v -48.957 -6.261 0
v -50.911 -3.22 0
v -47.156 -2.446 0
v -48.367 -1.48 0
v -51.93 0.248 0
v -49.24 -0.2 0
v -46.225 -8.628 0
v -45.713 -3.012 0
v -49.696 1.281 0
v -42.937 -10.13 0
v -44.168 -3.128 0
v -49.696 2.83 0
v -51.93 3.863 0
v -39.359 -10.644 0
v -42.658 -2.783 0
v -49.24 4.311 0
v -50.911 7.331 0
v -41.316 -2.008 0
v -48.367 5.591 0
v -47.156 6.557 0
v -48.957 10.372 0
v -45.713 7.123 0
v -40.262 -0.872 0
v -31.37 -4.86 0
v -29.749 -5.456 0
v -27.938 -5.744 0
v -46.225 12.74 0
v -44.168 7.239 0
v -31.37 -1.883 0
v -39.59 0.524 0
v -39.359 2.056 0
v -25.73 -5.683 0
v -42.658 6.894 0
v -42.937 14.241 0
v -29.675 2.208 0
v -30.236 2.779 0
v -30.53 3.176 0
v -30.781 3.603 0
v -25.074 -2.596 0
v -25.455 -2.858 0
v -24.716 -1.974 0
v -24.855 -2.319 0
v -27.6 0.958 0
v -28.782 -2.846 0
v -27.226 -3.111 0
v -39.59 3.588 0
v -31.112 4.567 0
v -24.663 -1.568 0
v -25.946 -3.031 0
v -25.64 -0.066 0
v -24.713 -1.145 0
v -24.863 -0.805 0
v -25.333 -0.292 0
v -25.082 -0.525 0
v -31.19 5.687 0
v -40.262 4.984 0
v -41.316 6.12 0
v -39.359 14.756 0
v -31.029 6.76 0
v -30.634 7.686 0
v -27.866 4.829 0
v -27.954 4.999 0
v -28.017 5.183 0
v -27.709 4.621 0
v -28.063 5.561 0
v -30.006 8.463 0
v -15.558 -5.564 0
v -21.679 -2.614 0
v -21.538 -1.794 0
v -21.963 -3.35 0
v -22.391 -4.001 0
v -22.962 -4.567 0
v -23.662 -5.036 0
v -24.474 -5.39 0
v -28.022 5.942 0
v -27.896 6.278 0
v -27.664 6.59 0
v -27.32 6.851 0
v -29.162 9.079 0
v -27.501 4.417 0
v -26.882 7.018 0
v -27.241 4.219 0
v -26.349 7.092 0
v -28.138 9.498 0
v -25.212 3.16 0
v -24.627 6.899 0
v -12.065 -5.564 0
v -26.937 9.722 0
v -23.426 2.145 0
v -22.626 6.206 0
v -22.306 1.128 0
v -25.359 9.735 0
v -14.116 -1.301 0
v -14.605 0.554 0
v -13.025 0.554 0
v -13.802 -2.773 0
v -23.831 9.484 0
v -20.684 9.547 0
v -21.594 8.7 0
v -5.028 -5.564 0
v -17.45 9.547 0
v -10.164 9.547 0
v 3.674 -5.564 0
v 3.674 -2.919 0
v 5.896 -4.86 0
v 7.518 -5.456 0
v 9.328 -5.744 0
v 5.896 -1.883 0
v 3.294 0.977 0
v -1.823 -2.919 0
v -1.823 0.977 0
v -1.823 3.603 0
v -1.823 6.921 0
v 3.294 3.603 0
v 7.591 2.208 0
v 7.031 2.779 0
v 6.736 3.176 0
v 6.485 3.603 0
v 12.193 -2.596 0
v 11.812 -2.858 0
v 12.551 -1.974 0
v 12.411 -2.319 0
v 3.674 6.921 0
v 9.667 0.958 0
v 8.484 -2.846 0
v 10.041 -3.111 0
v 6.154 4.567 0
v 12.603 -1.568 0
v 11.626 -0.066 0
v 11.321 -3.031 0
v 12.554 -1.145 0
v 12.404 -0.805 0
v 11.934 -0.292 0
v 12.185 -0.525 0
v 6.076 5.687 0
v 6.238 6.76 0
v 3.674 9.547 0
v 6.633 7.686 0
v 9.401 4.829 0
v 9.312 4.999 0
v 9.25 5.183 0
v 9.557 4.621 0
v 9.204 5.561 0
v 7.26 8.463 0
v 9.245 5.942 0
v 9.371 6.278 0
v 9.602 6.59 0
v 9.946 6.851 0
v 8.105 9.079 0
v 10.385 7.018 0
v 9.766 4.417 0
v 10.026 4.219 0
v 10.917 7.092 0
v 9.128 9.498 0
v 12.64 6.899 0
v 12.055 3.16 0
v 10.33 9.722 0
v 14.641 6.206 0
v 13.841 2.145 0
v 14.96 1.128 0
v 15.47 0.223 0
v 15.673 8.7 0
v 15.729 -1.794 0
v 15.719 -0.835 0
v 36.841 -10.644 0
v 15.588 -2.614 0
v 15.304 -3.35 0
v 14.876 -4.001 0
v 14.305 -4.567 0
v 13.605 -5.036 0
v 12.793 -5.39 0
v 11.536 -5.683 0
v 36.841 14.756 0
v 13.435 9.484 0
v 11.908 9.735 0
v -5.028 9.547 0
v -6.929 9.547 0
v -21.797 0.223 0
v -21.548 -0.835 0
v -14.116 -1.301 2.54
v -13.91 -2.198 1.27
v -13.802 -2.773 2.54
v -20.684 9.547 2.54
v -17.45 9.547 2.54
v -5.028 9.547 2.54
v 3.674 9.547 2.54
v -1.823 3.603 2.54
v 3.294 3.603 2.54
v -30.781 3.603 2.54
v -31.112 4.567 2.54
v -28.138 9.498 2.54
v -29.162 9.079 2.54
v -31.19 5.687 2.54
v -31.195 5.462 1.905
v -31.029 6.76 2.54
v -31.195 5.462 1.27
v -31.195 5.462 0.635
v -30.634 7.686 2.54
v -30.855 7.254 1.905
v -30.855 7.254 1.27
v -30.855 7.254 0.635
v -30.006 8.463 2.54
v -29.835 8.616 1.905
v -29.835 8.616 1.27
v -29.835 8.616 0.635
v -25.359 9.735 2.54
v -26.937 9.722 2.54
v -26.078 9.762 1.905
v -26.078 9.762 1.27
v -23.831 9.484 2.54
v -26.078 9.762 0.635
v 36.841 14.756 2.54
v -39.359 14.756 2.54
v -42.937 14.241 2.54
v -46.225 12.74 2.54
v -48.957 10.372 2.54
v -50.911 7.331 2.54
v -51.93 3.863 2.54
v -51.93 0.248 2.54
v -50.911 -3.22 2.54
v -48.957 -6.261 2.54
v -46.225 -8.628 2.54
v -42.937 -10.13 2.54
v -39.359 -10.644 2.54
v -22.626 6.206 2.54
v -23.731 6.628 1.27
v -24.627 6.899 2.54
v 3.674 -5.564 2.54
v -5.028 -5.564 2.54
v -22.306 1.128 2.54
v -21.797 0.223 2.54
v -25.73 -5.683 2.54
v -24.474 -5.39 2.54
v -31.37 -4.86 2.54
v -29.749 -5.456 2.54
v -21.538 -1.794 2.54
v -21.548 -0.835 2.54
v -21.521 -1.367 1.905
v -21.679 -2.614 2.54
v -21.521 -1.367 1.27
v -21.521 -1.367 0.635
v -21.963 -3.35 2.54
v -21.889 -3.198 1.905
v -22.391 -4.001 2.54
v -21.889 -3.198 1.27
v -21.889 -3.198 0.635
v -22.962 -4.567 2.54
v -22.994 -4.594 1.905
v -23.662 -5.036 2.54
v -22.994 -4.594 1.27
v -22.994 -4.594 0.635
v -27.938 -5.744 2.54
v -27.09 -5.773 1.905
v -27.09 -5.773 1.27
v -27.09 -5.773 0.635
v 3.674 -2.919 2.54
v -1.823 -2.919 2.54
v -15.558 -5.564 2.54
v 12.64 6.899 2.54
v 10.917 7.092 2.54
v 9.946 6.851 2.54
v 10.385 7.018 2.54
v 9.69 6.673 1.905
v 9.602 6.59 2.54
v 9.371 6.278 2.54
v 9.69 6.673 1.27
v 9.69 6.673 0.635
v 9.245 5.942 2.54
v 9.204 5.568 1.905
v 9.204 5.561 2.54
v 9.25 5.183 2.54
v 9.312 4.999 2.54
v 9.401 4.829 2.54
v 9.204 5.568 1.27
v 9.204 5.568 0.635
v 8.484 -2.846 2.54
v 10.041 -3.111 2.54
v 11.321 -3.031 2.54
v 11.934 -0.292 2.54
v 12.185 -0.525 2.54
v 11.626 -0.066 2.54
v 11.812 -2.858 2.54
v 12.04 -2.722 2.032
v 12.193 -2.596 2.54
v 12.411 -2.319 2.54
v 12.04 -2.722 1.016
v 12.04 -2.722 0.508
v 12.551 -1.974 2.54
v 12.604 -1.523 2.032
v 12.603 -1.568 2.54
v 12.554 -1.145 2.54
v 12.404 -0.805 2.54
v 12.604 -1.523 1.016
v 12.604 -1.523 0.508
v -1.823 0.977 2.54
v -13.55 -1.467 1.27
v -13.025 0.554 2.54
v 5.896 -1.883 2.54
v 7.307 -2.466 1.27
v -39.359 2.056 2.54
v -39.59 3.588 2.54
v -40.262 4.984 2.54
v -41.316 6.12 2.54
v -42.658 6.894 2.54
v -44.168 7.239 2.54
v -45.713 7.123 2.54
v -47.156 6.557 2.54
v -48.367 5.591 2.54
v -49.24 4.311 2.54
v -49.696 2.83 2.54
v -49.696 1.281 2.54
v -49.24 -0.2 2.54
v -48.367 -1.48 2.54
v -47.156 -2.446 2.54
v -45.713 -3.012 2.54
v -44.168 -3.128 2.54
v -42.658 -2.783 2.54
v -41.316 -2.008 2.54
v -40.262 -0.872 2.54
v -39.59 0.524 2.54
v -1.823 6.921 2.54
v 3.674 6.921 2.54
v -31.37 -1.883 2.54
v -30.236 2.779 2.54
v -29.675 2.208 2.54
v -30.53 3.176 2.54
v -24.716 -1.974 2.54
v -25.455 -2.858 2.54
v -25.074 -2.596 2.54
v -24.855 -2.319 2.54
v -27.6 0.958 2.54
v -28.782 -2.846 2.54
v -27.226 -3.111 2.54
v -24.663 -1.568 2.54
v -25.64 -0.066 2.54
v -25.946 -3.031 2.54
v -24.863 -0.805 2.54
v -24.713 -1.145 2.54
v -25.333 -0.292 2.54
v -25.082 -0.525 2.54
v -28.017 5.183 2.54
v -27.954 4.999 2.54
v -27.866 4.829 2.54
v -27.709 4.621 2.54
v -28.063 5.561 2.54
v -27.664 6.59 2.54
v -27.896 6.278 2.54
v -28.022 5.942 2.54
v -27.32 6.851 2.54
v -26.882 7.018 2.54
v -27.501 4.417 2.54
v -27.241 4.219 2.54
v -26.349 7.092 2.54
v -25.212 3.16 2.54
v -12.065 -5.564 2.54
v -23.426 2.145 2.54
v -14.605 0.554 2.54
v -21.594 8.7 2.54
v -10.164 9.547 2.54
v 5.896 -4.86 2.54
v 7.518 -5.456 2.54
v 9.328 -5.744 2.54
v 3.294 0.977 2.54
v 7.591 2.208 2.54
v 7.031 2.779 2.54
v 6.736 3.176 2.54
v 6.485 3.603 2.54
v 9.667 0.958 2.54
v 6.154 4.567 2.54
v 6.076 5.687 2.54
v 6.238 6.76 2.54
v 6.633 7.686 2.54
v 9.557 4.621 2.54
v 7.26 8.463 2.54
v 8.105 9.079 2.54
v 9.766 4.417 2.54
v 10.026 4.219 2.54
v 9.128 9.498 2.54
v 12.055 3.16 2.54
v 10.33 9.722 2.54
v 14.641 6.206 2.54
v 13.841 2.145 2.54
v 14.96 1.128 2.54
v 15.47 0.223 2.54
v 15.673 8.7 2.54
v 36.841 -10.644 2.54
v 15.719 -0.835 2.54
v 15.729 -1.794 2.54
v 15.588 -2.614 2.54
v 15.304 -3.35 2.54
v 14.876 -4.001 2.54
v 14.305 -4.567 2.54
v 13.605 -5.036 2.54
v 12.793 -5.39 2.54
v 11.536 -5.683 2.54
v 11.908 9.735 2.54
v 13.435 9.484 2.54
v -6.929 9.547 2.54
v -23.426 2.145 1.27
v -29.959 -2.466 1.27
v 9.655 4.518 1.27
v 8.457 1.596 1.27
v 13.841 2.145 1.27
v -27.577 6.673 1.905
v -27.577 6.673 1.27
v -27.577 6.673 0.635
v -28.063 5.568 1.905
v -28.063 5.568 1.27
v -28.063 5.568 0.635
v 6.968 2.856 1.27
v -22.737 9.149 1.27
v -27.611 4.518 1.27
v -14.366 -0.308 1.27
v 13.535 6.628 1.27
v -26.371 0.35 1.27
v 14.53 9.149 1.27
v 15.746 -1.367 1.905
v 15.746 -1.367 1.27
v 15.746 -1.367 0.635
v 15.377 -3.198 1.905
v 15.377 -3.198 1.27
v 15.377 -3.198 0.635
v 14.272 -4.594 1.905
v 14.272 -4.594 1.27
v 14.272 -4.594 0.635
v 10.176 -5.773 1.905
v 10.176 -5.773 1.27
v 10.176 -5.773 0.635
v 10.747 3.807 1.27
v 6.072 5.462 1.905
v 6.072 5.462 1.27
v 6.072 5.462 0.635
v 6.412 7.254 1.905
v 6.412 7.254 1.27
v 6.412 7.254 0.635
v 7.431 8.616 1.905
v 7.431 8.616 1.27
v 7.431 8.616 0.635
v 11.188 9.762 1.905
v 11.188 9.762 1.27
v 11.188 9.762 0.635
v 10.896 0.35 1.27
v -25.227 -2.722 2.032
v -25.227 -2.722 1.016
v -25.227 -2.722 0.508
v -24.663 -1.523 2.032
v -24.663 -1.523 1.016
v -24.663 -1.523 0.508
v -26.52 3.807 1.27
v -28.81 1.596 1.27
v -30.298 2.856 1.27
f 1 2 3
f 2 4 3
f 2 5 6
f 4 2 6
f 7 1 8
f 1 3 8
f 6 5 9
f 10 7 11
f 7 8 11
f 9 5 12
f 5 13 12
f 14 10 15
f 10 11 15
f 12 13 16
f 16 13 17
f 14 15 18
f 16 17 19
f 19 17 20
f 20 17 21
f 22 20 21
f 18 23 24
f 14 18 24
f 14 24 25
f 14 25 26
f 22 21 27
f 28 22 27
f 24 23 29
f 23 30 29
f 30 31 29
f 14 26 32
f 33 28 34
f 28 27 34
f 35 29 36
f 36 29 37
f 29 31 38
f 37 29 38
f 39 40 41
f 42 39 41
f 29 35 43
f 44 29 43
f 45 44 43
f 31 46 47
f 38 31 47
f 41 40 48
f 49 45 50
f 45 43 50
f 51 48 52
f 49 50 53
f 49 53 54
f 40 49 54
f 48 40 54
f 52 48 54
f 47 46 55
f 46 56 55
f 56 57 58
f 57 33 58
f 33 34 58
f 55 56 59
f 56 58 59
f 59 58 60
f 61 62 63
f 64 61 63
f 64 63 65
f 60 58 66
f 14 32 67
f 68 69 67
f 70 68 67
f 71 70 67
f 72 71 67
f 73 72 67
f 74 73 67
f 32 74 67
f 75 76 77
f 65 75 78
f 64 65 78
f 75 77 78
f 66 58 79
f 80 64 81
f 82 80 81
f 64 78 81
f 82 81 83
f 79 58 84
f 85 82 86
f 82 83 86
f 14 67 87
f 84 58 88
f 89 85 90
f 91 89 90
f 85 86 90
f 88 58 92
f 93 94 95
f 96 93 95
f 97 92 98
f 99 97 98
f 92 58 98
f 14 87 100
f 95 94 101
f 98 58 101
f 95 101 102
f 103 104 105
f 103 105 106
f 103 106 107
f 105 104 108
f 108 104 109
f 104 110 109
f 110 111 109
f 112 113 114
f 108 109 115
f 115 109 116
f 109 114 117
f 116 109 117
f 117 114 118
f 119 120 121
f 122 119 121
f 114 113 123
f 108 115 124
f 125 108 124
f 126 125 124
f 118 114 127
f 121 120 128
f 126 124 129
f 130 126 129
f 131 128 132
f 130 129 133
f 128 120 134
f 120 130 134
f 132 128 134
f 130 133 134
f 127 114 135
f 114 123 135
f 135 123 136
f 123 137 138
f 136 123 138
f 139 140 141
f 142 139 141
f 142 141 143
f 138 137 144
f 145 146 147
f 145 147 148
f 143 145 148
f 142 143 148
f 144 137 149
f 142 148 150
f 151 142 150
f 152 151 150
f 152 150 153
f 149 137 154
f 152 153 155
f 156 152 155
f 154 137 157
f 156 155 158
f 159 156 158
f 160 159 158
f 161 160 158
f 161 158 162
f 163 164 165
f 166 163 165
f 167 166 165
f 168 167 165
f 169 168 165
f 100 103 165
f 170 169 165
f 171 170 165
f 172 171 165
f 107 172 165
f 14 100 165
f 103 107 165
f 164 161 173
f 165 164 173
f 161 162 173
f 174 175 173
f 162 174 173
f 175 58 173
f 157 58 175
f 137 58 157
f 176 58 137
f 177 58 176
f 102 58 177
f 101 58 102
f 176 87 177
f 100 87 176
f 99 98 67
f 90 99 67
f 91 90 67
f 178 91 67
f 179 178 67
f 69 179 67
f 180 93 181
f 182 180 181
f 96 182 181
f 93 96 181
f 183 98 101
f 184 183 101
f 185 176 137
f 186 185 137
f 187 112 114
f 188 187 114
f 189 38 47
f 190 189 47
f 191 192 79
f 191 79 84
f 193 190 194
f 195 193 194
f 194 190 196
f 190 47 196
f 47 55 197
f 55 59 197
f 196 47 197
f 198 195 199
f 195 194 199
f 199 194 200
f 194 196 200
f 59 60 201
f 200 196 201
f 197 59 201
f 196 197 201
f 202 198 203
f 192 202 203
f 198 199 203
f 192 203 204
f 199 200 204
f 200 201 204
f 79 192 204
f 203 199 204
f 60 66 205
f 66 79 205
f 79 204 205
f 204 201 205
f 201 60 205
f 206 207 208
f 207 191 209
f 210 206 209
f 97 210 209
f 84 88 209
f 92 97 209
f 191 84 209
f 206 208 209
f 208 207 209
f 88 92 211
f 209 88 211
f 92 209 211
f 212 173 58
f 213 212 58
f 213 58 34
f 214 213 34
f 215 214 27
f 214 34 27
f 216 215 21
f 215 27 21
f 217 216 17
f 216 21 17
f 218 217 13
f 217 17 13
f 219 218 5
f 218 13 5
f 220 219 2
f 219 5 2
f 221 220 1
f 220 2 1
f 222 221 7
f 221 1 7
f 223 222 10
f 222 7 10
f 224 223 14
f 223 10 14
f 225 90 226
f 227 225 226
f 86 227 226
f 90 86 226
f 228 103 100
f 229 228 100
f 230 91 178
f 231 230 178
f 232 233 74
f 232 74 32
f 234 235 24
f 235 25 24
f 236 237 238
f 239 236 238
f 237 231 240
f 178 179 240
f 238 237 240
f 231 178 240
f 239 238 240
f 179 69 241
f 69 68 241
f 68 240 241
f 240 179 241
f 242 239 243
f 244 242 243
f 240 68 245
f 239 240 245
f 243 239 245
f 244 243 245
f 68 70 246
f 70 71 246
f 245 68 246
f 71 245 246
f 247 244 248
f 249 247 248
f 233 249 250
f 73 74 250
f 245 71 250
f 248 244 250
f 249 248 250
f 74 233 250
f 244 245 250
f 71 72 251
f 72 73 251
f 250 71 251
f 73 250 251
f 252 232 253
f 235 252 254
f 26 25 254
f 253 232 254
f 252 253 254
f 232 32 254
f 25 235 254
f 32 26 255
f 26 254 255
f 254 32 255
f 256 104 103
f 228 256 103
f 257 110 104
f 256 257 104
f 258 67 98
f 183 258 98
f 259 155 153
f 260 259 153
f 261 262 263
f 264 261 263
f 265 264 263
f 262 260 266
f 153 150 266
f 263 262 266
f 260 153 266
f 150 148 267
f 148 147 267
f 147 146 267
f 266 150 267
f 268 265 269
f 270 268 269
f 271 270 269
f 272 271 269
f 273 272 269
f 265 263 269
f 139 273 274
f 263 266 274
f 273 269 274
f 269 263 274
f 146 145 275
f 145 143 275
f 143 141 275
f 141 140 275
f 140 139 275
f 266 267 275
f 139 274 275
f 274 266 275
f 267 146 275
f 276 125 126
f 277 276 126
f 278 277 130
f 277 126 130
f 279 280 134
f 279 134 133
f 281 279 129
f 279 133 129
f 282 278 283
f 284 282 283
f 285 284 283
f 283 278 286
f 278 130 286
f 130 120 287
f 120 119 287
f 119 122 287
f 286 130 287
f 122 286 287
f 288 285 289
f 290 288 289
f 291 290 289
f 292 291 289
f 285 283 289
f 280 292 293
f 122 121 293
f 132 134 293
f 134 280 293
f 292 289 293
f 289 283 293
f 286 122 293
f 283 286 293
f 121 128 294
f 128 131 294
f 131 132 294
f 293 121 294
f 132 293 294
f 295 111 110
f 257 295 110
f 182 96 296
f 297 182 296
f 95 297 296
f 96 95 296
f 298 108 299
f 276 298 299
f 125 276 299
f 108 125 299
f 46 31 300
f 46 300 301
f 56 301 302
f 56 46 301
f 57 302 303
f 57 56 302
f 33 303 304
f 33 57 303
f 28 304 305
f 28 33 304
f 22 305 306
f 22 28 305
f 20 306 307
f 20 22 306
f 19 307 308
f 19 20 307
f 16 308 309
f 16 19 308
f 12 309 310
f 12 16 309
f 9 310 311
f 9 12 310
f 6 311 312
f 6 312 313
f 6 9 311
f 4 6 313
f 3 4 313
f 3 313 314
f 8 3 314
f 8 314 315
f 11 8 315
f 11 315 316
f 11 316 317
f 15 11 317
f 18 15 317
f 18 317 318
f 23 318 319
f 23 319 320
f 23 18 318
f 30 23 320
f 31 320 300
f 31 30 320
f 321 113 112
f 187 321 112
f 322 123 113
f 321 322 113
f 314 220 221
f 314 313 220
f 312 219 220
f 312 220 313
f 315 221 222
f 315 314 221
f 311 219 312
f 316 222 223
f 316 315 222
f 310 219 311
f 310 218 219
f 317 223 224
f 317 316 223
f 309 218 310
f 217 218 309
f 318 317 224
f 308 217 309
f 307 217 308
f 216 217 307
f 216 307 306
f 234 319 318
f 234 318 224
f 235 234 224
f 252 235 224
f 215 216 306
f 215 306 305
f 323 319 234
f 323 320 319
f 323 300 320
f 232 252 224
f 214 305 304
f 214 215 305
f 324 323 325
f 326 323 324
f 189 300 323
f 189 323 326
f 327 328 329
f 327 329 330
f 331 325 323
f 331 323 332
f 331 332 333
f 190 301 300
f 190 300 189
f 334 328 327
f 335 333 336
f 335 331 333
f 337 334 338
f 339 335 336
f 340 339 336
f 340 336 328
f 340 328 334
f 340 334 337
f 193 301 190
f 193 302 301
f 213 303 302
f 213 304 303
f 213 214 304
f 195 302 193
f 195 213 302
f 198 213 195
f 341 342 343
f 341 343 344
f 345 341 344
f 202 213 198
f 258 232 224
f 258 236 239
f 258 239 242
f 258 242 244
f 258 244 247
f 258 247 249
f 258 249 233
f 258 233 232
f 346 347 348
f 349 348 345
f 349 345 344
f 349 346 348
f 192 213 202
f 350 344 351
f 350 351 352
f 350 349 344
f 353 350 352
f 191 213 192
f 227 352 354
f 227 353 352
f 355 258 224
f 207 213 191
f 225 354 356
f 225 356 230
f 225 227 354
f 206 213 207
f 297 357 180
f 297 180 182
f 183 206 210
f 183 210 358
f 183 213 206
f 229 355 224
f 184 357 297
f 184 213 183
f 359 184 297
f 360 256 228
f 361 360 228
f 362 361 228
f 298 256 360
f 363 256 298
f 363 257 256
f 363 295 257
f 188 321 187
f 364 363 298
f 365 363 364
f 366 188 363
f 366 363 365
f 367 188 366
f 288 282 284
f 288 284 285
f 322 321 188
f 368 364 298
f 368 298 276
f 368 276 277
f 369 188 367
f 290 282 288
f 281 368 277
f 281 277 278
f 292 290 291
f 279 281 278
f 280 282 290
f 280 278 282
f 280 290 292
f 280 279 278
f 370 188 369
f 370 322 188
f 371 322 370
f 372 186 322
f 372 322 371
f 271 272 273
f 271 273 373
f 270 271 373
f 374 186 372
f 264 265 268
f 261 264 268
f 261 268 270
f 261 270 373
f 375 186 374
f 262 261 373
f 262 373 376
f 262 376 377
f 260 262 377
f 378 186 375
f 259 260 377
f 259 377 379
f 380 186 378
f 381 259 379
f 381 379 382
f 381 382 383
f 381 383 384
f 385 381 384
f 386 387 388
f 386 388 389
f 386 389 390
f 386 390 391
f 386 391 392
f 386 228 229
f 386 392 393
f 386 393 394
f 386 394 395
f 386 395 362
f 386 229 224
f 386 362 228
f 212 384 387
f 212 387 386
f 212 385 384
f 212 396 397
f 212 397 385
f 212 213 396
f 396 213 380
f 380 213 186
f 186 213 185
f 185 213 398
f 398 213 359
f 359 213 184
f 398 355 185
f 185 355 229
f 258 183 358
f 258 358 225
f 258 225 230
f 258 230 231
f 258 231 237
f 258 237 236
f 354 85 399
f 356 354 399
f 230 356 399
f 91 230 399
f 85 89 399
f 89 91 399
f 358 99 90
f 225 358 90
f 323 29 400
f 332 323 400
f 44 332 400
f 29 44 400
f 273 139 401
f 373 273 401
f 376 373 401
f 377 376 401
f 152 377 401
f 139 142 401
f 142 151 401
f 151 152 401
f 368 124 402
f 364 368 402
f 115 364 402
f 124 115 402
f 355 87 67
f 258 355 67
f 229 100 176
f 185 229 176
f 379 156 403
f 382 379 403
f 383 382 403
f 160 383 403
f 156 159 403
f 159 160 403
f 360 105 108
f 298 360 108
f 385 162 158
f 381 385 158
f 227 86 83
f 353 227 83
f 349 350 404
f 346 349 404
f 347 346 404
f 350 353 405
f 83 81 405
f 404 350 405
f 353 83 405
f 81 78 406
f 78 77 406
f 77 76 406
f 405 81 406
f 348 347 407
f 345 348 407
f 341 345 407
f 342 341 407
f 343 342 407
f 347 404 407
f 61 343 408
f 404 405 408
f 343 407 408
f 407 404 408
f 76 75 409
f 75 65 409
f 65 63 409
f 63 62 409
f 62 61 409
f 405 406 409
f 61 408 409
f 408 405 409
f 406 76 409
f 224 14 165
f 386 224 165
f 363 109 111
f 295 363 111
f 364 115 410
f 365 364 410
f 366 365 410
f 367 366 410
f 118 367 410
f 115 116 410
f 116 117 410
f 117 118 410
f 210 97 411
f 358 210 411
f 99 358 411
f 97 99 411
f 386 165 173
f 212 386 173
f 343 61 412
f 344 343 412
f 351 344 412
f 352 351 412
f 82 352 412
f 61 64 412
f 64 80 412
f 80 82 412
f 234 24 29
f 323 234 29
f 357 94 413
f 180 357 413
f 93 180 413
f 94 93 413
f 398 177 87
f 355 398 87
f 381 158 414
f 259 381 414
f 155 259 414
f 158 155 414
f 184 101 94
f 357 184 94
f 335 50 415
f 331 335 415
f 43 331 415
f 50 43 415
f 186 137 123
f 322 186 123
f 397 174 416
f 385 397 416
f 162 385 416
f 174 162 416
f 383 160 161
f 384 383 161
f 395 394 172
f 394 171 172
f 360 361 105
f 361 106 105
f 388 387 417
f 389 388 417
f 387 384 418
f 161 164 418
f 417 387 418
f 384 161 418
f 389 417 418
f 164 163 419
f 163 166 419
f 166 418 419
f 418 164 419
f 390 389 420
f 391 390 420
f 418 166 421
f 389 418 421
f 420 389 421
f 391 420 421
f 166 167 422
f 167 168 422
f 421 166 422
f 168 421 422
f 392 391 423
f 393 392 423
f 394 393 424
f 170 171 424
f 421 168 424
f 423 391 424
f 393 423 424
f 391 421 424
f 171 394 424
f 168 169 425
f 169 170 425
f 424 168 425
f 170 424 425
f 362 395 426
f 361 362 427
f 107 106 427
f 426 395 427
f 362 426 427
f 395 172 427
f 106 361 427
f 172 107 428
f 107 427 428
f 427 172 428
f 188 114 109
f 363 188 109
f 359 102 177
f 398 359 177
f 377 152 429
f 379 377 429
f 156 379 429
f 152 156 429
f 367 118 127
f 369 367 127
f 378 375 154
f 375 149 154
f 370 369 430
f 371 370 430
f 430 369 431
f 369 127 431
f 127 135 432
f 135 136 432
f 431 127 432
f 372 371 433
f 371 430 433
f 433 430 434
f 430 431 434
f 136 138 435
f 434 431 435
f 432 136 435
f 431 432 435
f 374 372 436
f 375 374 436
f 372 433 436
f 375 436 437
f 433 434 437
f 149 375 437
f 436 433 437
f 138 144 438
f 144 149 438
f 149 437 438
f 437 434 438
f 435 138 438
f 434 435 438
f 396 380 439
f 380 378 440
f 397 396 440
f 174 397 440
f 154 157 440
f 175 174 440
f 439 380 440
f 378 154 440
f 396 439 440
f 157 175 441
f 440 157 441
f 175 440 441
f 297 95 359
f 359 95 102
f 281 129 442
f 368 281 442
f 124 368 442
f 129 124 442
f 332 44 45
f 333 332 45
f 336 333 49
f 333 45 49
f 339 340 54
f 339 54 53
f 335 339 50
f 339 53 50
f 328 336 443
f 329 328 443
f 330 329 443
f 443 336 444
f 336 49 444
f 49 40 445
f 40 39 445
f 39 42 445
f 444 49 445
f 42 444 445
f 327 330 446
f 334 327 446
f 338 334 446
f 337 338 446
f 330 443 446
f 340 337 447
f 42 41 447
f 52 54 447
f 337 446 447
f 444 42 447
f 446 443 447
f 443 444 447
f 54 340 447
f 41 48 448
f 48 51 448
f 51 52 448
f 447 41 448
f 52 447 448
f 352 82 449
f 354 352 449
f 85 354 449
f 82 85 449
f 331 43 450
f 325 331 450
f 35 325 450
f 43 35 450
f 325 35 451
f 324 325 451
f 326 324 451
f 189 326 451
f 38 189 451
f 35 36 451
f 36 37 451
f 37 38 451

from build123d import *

# Parameters (mm, degrees)
F0_R     = 5.1978501012
F1_DEPTH = 2.54


with BuildPart() as f1:
    # F0 (on Top) → F1 (new body)
    with BuildSketch(Plane.XY):
        with BuildLine():
            Line((36.8412211885, 14.7556602153), (-39.3587788115, 14.7556602153))
            ThreePointArc((-39.3587788115, 14.7556602153), (-52.0587788115, 2.0556602153), (-39.3587788115, -10.6443397847))
            Line((-39.3587788115, -10.6443397847), (36.8412211885, -10.6443397847))
            Line((36.8412211885, -10.6443397847), (36.8412211885, 14.7556602153))
        make_face()
        with Locations((-44.5566289127, 2.0556602153)):
            Circle(F0_R, mode=Mode.SUBTRACT)
        with BuildLine():
            add(Edge.make_bspline(
                [(-22.306449124, 1.1279649028), (-21.5209673532, 0.1109727153), (-21.5209673532, -1.3673866597)],
                knots=[0, 0, 0, 1, 1, 1], degree=2))
            add(Edge.make_bspline(
                [(-21.5209673532, -1.3673866597), (-21.5209673532, -3.4146002013), (-22.9943657907, -4.5936496805)],
                knots=[0, 0, 0, 1, 1, 1], degree=2))
            add(Edge.make_bspline(
                [(-22.9943657907, -4.5936496805), (-24.4677642282, -5.7726991597), (-27.0904465199, -5.7726991597)],
                knots=[0, 0, 0, 1, 1, 1], degree=2))
            add(Edge.make_bspline(
                [(-27.0904465199, -5.7726991597), (-29.5113840199, -5.7726991597), (-31.3700819365, -4.8598866597)],
                knots=[0, 0, 0, 1, 1, 1], degree=2))
            Line((-31.3700819365, -4.8598866597), (-31.3700819365, -1.8833241597))
            add(Edge.make_bspline(
                [(-31.3700819365, -1.8833241597), (-29.8421131865, -2.5679335347), (-28.7821262074, -2.8457460347)],
                knots=[0, 0, 0, 1, 1, 1], degree=2))
            add(Edge.make_bspline(
                [(-28.7821262074, -2.8457460347), (-27.7221392282, -3.1235585347), (-26.8423996449, -3.1235585347)],
                knots=[0, 0, 0, 1, 1, 1], degree=2))
            add(Edge.make_bspline(
                [(-26.8423996449, -3.1235585347), (-25.7906808949, -3.1235585347), (-25.2267876657, -2.7217225972)],
                knots=[0, 0, 0, 1, 1, 1], degree=2))
            add(Edge.make_bspline(
                [(-25.2267876657, -2.7217225972), (-24.6628944365, -2.3198866597), (-24.6628944365, -1.522829368)],
                knots=[0, 0, 0, 1, 1, 1], degree=2))
            add(Edge.make_bspline(
                [(-24.6628944365, -1.522829368), (-24.6628944365, -1.0796522847), (-24.9109413115, -0.7323866597)],
                knots=[0, 0, 0, 1, 1, 1], degree=2))
            add(Edge.make_bspline(
                [(-24.9109413115, -0.7323866597), (-25.1589881865, -0.3851210347), (-25.640199124, -0.0659673888)],
                knots=[0, 0, 0, 1, 1, 1], degree=2))
            add(Edge.make_bspline(
                [(-25.640199124, -0.0659673888), (-26.1214100615, 0.253186257), (-27.5997694365, 0.957639382)],
                knots=[0, 0, 0, 1, 1, 1], degree=2))
            add(Edge.make_bspline(
                [(-27.5997694365, 0.957639382), (-28.9822173532, 1.6091758403), (-29.6750949574, 2.207795632)],
                knots=[0, 0, 0, 1, 1, 1], degree=2))
            add(Edge.make_bspline(
                [(-29.6750949574, 2.207795632), (-30.3679725615, 2.8064154237), (-30.7813840199, 3.6034727153)],
                knots=[0, 0, 0, 1, 1, 1], degree=2))
            add(Edge.make_bspline(
                [(-30.7813840199, 3.6034727153), (-31.1947954782, 4.400530007), (-31.1947954782, 5.462170632)],
                knots=[0, 0, 0, 1, 1, 1], degree=2))
            add(Edge.make_bspline(
                [(-31.1947954782, 5.462170632), (-31.1947954782, 7.4696966737), (-29.8354986032, 8.6156732362)],
                knots=[0, 0, 0, 1, 1, 1], degree=2))
            add(Edge.make_bspline(
                [(-29.8354986032, 8.6156732362), (-28.4762017282, 9.7616497987), (-26.0784152699, 9.7616497987)],
                knots=[0, 0, 0, 1, 1, 1], degree=2))
            add(Edge.make_bspline(
                [(-26.0784152699, 9.7616497987), (-24.9010194365, 9.7616497987), (-23.8311105824, 9.4838372987)],
                knots=[0, 0, 0, 1, 1, 1], degree=2))
            add(Edge.make_bspline(
                [(-23.8311105824, 9.4838372987), (-22.7612017282, 9.2060247987), (-21.5937277699, 8.7000091737)],
                knots=[0, 0, 0, 1, 1, 1], degree=2))
            Line((-21.5937277699, 8.7000091737), (-22.6256027699, 6.206311257))
            add(Edge.make_bspline(
                [(-22.6256027699, 6.206311257), (-23.8360715199, 6.702405007), (-24.6265142282, 6.8991888612)],
                knots=[0, 0, 0, 1, 1, 1], degree=2))
            add(Edge.make_bspline(
                [(-24.6265142282, 6.8991888612), (-25.4169569365, 7.0959727153), (-26.1809413115, 7.0959727153)],
                knots=[0, 0, 0, 1, 1, 1], degree=2))
            add(Edge.make_bspline(
                [(-26.1809413115, 7.0959727153), (-27.0904465199, 7.0959727153), (-27.5766183949, 6.672639382)],
                knots=[0, 0, 0, 1, 1, 1], degree=2))
            add(Edge.make_bspline(
                [(-27.5766183949, 6.672639382), (-28.0627902699, 6.2493060487), (-28.0627902699, 5.5680039653)],
                knots=[0, 0, 0, 1, 1, 1], degree=2))
            add(Edge.make_bspline(
                [(-28.0627902699, 5.5680039653), (-28.0627902699, 5.144670632), (-27.8660064157, 4.8288242778)],
                knots=[0, 0, 0, 1, 1, 1], degree=2))
            add(Edge.make_bspline(
                [(-27.8660064157, 4.8288242778), (-27.6692225615, 4.5129779237), (-27.2409282907, 4.2186289653)],
                knots=[0, 0, 0, 1, 1, 1], degree=2))
            add(Edge.make_bspline(
                [(-27.2409282907, 4.2186289653), (-26.8126340199, 3.924280007), (-25.2119048532, 3.160295632)],
                knots=[0, 0, 0, 1, 1, 1], degree=2))
            add(Edge.make_bspline(
                [(-25.2119048532, 3.160295632), (-23.0919308949, 2.1449570903), (-22.306449124, 1.1279649028)],
                knots=[0, 0, 0, 1, 1, 1], degree=2))
        make_face(mode=Mode.SUBTRACT)
        with BuildLine():
            Line((-13.0245350615, 0.5541497987), (-10.1637277699, 9.5466758403))
            Line((-10.1637277699, 9.5466758403), (-6.9291965199, 9.5466758403))
            Line((-6.9291965199, 9.5466758403), (-12.0654204782, -5.5643397847))
            Line((-12.0654204782, -5.5643397847), (-15.5579204782, -5.5643397847))
            Line((-15.5579204782, -5.5643397847), (-20.6842225615, 9.5466758403))
            Line((-20.6842225615, 9.5466758403), (-17.4496913115, 9.5466758403))
            Line((-17.4496913115, 9.5466758403), (-14.6054204782, 0.5541497987))
            add(Edge.make_bspline(
                [(-14.6054204782, 0.5541497987), (-14.3706027699, -0.242907493), (-14.1159413115, -1.3012408263)],
                knots=[0, 0, 0, 1, 1, 1], degree=2))
            add(Edge.make_bspline(
                [(-14.1159413115, -1.3012408263), (-13.8612798532, -2.3595741597), (-13.8017486032, -2.772985618)],
                knots=[0, 0, 0, 1, 1, 1], degree=2))
            add(Edge.make_bspline(
                [(-13.8017486032, -2.772985618), (-13.6859933949, -1.8237929097), (-13.0245350615, 0.5541497987)],
                knots=[0, 0, 0, 1, 1, 1], degree=2))
        make_face(mode=Mode.SUBTRACT)
        Polygon((3.6739805635, -2.9185064513), (3.6739805635, -5.5643397847), (-5.0275038115, -5.5643397847), (-5.0275038115, 9.5466758403), (3.6739805635, 9.5466758403), (3.6739805635, 6.920686257), (-1.8227381865, 6.920686257), (-1.8227381865, 3.6034727153), (3.2936420218, 3.6034727153), (3.2936420218, 0.977483132), (-1.8227381865, 0.977483132), (-1.8227381865, -2.9185064513), align=None, mode=Mode.SUBTRACT)
        with BuildLine():
            add(Edge.make_bspline(
                [(14.960113376, 1.1279649028), (15.7455951468, 0.1109727153), (15.7455951468, -1.3673866597)],
                knots=[0, 0, 0, 1, 1, 1], degree=2))
            add(Edge.make_bspline(
                [(15.7455951468, -1.3673866597), (15.7455951468, -3.4146002013), (14.2721967093, -4.5936496805)],
                knots=[0, 0, 0, 1, 1, 1], degree=2))
            add(Edge.make_bspline(
                [(14.2721967093, -4.5936496805), (12.7987982718, -5.7726991597), (10.1761159801, -5.7726991597)],
                knots=[0, 0, 0, 1, 1, 1], degree=2))
            add(Edge.make_bspline(
                [(10.1761159801, -5.7726991597), (7.7551784801, -5.7726991597), (5.8964805635, -4.8598866597)],
                knots=[0, 0, 0, 1, 1, 1], degree=2))
            Line((5.8964805635, -4.8598866597), (5.8964805635, -1.8833241597))
            add(Edge.make_bspline(
                [(5.8964805635, -1.8833241597), (7.4244493135, -2.5679335347), (8.4844362926, -2.8457460347)],
                knots=[0, 0, 0, 1, 1, 1], degree=2))
            add(Edge.make_bspline(
                [(8.4844362926, -2.8457460347), (9.5444232718, -3.1235585347), (10.4241628551, -3.1235585347)],
                knots=[0, 0, 0, 1, 1, 1], degree=2))
            add(Edge.make_bspline(
                [(10.4241628551, -3.1235585347), (11.4758816051, -3.1235585347), (12.0397748343, -2.7217225972)],
                knots=[0, 0, 0, 1, 1, 1], degree=2))
            add(Edge.make_bspline(
                [(12.0397748343, -2.7217225972), (12.6036680635, -2.3198866597), (12.6036680635, -1.522829368)],
                knots=[0, 0, 0, 1, 1, 1], degree=2))
            add(Edge.make_bspline(
                [(12.6036680635, -1.522829368), (12.6036680635, -1.0796522847), (12.3556211885, -0.7323866597)],
                knots=[0, 0, 0, 1, 1, 1], degree=2))
            add(Edge.make_bspline(
                [(12.3556211885, -0.7323866597), (12.1075743135, -0.3851210347), (11.626363376, -0.0659673888)],
                knots=[0, 0, 0, 1, 1, 1], degree=2))
            add(Edge.make_bspline(
                [(11.626363376, -0.0659673888), (11.1451524385, 0.253186257), (9.6667930635, 0.957639382)],
                knots=[0, 0, 0, 1, 1, 1], degree=2))
            add(Edge.make_bspline(
                [(9.6667930635, 0.957639382), (8.2843451468, 1.6091758403), (7.5914675426, 2.207795632)],
                knots=[0, 0, 0, 1, 1, 1], degree=2))
            add(Edge.make_bspline(
                [(7.5914675426, 2.207795632), (6.8985899385, 2.8064154237), (6.4851784801, 3.6034727153)],
                knots=[0, 0, 0, 1, 1, 1], degree=2))
            add(Edge.make_bspline(
                [(6.4851784801, 3.6034727153), (6.0717670218, 4.400530007), (6.0717670218, 5.462170632)],
                knots=[0, 0, 0, 1, 1, 1], degree=2))
            add(Edge.make_bspline(
                [(6.0717670218, 5.462170632), (6.0717670218, 7.4696966737), (7.4310638968, 8.6156732362)],
                knots=[0, 0, 0, 1, 1, 1], degree=2))
            add(Edge.make_bspline(
                [(7.4310638968, 8.6156732362), (8.7903607718, 9.7616497987), (11.1881472301, 9.7616497987)],
                knots=[0, 0, 0, 1, 1, 1], degree=2))
            add(Edge.make_bspline(
                [(11.1881472301, 9.7616497987), (12.3655430635, 9.7616497987), (13.4354519176, 9.4838372987)],
                knots=[0, 0, 0, 1, 1, 1], degree=2))
            add(Edge.make_bspline(
                [(13.4354519176, 9.4838372987), (14.5053607718, 9.2060247987), (15.6728347301, 8.7000091737)],
                knots=[0, 0, 0, 1, 1, 1], degree=2))
            Line((15.6728347301, 8.7000091737), (14.6409597301, 6.206311257))
            add(Edge.make_bspline(
                [(14.6409597301, 6.206311257), (13.4304909801, 6.702405007), (12.6400482718, 6.8991888612)],
                knots=[0, 0, 0, 1, 1, 1], degree=2))
            add(Edge.make_bspline(
                [(12.6400482718, 6.8991888612), (11.8496055635, 7.0959727153), (11.0856211885, 7.0959727153)],
                knots=[0, 0, 0, 1, 1, 1], degree=2))
            add(Edge.make_bspline(
                [(11.0856211885, 7.0959727153), (10.1761159801, 7.0959727153), (9.6899441051, 6.672639382)],
                knots=[0, 0, 0, 1, 1, 1], degree=2))
            add(Edge.make_bspline(
                [(9.6899441051, 6.672639382), (9.2037722301, 6.2493060487), (9.2037722301, 5.5680039653)],
                knots=[0, 0, 0, 1, 1, 1], degree=2))
            add(Edge.make_bspline(
                [(9.2037722301, 5.5680039653), (9.2037722301, 5.144670632), (9.4005560843, 4.8288242778)],
                knots=[0, 0, 0, 1, 1, 1], degree=2))
            add(Edge.make_bspline(
                [(9.4005560843, 4.8288242778), (9.5973399385, 4.5129779237), (10.0256342093, 4.2186289653)],
                knots=[0, 0, 0, 1, 1, 1], degree=2))
            add(Edge.make_bspline(
                [(10.0256342093, 4.2186289653), (10.4539284801, 3.924280007), (12.0546576468, 3.160295632)],
                knots=[0, 0, 0, 1, 1, 1], degree=2))
            add(Edge.make_bspline(
                [(12.0546576468, 3.160295632), (14.1746316051, 2.1449570903), (14.960113376, 1.1279649028)],
                knots=[0, 0, 0, 1, 1, 1], degree=2))
        make_face(mode=Mode.SUBTRACT)
    extrude(amount=F1_DEPTH)


solid = f1.part
